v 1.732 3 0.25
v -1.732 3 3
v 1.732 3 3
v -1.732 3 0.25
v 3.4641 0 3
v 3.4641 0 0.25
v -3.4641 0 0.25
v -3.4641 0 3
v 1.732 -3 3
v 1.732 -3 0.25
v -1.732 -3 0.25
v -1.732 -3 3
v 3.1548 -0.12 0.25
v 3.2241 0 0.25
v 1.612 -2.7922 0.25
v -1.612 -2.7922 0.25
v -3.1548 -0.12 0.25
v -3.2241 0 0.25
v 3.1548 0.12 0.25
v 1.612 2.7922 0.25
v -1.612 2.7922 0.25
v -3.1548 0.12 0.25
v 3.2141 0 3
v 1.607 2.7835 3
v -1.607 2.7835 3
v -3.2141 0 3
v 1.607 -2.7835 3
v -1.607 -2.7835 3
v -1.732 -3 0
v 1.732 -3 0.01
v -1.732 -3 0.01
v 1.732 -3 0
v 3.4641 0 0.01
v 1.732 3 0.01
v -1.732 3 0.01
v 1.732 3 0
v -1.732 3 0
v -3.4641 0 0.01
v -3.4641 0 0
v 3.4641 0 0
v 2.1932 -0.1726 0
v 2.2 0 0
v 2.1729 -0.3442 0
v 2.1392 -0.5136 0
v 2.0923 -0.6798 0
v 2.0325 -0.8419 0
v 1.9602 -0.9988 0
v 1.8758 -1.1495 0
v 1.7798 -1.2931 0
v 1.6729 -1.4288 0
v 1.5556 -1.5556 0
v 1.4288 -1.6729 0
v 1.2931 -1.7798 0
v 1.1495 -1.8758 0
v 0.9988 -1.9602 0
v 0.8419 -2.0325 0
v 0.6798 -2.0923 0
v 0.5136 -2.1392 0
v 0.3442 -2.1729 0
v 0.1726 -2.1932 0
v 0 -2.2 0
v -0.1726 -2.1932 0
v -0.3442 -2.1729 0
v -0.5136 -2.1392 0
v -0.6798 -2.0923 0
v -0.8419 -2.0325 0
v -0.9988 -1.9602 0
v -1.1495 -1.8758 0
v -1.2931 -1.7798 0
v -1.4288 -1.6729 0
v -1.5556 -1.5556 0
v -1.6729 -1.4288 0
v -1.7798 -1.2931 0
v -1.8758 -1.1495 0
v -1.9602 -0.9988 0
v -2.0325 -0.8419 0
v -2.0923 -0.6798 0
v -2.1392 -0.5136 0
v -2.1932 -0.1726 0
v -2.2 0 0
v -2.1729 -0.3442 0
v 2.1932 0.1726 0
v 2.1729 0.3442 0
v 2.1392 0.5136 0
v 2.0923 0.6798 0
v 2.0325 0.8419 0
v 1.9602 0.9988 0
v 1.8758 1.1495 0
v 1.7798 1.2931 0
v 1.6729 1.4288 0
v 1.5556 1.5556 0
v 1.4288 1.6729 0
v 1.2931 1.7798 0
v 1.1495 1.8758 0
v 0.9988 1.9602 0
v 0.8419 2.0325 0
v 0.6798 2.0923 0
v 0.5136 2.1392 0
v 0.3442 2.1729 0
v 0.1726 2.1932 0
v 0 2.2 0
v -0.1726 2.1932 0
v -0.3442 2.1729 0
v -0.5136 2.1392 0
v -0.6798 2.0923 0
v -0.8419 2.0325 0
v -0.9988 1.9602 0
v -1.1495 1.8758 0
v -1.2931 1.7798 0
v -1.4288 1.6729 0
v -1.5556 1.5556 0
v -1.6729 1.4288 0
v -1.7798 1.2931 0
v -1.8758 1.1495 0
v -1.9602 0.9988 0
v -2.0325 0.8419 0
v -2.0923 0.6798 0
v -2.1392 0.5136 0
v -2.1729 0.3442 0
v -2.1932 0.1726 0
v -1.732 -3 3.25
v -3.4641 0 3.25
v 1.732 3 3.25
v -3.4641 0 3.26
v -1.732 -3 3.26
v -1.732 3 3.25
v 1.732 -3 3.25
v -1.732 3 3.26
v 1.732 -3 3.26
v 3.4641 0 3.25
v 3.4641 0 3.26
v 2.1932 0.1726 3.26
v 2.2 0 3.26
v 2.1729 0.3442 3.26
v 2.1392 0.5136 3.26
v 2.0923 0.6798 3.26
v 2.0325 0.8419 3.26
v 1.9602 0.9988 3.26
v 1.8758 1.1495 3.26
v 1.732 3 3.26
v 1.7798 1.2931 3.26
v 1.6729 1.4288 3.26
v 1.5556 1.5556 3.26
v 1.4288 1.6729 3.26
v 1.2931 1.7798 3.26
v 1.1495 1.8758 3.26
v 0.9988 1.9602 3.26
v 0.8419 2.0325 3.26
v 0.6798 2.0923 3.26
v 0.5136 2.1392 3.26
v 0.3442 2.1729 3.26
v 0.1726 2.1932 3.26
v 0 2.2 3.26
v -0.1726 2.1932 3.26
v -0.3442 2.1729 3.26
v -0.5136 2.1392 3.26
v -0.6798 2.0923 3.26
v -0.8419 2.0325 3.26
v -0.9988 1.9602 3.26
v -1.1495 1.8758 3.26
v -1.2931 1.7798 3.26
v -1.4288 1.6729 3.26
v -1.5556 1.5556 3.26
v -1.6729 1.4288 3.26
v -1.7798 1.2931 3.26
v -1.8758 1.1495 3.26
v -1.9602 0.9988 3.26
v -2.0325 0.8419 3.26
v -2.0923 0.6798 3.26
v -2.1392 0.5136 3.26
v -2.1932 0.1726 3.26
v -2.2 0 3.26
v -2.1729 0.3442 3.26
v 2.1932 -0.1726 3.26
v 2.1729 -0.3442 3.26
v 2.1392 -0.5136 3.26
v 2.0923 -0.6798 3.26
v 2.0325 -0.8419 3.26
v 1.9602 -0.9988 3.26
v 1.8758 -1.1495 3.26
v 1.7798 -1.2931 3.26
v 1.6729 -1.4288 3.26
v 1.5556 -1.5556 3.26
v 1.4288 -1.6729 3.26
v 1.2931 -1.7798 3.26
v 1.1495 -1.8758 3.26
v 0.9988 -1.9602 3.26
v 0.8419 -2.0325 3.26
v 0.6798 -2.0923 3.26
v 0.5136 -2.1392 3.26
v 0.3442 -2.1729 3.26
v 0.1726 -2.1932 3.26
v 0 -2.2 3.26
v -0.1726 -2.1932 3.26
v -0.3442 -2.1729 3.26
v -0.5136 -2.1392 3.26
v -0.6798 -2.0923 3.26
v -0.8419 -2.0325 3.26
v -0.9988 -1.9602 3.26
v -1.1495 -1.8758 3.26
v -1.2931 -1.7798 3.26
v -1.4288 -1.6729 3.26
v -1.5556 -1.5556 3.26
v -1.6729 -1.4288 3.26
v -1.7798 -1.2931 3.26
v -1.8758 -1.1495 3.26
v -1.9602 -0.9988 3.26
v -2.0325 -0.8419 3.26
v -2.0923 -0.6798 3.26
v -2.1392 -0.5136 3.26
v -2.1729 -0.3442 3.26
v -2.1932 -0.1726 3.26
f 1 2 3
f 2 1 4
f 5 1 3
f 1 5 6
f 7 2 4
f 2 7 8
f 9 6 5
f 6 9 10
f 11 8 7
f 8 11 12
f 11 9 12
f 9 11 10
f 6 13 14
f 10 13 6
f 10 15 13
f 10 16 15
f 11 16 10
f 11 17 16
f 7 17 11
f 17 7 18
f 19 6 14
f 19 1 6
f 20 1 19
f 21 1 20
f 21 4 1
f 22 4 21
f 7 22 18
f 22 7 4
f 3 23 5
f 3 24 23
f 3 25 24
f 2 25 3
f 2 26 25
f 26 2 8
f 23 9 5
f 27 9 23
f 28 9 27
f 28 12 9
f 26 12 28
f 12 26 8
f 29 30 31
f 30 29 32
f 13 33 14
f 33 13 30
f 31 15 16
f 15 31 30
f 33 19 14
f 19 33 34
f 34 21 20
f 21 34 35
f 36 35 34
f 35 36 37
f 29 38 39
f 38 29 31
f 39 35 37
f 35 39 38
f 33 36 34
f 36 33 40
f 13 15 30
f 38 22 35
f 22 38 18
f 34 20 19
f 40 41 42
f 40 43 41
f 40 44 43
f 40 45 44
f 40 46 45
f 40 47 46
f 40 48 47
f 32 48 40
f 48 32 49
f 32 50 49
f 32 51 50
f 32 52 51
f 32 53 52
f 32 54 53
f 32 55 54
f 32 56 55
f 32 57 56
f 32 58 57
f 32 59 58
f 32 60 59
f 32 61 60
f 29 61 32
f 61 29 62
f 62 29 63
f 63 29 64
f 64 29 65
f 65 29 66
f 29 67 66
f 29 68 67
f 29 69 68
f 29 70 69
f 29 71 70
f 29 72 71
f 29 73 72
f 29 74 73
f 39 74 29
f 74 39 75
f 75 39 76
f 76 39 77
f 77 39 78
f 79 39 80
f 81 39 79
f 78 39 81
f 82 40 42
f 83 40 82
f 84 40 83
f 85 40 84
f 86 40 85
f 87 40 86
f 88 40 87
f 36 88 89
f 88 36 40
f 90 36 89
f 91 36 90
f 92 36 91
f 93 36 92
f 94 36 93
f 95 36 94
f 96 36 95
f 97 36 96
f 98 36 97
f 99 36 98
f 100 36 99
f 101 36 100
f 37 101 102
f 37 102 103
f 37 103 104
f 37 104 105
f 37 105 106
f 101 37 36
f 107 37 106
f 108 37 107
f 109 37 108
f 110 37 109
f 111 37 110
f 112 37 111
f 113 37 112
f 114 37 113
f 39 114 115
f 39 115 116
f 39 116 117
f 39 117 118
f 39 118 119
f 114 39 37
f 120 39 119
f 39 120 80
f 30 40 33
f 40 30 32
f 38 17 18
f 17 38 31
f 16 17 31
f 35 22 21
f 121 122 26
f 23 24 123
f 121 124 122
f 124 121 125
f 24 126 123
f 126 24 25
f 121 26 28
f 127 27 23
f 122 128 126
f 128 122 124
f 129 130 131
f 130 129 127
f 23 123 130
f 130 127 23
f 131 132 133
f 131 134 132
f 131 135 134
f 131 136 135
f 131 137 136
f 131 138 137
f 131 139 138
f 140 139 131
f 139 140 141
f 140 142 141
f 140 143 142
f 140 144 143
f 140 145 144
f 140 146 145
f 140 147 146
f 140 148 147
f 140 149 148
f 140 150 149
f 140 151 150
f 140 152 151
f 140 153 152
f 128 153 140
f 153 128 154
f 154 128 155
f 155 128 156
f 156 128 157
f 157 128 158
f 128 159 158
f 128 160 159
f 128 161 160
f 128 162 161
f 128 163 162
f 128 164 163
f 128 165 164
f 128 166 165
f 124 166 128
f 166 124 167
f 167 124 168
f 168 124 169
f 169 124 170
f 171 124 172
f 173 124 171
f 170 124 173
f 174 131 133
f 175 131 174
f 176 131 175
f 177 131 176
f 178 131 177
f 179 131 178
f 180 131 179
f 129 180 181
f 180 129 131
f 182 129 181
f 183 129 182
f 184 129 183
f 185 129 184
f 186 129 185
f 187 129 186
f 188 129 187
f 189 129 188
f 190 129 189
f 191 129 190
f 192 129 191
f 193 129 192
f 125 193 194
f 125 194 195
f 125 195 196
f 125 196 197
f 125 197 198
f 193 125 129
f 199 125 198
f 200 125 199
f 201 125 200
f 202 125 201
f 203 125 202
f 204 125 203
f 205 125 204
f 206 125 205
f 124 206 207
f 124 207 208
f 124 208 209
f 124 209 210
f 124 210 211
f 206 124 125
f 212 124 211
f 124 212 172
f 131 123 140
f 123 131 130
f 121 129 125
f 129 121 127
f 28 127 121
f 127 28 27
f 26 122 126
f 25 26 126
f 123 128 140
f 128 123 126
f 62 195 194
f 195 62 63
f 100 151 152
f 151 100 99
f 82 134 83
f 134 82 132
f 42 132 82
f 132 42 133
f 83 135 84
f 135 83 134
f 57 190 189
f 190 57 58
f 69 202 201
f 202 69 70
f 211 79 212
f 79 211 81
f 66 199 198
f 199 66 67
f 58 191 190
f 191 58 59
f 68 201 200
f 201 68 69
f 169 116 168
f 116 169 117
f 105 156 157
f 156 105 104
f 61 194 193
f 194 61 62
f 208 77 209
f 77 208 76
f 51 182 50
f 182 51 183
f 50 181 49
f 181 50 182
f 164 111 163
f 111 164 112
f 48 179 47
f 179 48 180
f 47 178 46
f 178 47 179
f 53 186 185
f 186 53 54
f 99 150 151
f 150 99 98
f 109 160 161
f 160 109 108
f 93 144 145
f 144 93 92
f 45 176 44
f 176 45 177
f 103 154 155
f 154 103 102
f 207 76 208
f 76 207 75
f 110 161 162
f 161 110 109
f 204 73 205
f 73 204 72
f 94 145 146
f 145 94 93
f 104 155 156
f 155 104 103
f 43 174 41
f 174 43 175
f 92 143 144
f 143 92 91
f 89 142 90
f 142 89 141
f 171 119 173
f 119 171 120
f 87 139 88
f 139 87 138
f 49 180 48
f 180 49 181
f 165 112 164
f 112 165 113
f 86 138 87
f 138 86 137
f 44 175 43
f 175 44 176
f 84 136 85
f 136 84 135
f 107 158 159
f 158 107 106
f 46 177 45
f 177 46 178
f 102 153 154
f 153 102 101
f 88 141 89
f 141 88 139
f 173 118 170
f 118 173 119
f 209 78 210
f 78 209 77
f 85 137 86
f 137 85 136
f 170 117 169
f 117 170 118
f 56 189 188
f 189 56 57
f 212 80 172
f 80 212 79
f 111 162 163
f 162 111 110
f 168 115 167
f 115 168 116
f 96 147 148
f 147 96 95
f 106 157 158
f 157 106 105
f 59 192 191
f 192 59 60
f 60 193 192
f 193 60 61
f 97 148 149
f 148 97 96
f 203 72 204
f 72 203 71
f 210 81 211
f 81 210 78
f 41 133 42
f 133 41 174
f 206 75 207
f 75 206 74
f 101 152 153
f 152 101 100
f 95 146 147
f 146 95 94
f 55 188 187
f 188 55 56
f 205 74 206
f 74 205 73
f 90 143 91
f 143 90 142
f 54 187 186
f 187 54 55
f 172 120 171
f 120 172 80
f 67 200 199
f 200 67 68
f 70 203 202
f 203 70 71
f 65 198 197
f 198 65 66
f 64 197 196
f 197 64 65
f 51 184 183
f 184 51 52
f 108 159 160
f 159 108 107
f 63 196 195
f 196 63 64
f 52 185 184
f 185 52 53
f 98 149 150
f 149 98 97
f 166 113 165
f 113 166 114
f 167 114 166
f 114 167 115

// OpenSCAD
$fn = 80;

// T-slot nut parameters (mm)
screw_d = 4.0;          // screw diameter
clearance = 0.4;        // clearance for screw hole
hole_d = screw_d + clearance;

across_flats = 6.0;     // hex across flats
thickness = 3.25;       // nut thickness

// Small edge chamfer to ease insertion (approx)
chamfer = 0.25;

// Derived
hex_R = across_flats / sqrt(3); // circumradius for hex with given across-flats

module hex_prism(h, R){
    linear_extrude(height=h)
        polygon(points=[
            [ R, 0],
            [ R/2,  R*sqrt(3)/2],
            [-R/2,  R*sqrt(3)/2],
            [-R, 0],
            [-R/2, -R*sqrt(3)/2],
            [ R/2, -R*sqrt(3)/2]
        ]);
}

module tslot_nut(){
    difference(){
        // Body with slight chamfer on both faces
        union(){
            // middle section
            translate([0,0,chamfer])
                hex_prism(thickness - 2*chamfer, hex_R);

            // bottom chamfer
            hull(){
                translate([0,0,0])
                    hex_prism(0.01, hex_R);
                translate([0,0,chamfer])
                    hex_prism(0.01, max(hex_R - chamfer, 0.01));
            }

            // top chamfer
            hull(){
                translate([0,0,thickness - chamfer])
                    hex_prism(0.01, max(hex_R - chamfer, 0.01));
                translate([0,0,thickness])
                    hex_prism(0.01, hex_R);
            }
        }

        // Through hole for screw
        translate([0,0,-0.5])
            cylinder(h=thickness+1.0, d=hole_d);
    }
}

tslot_nut();
